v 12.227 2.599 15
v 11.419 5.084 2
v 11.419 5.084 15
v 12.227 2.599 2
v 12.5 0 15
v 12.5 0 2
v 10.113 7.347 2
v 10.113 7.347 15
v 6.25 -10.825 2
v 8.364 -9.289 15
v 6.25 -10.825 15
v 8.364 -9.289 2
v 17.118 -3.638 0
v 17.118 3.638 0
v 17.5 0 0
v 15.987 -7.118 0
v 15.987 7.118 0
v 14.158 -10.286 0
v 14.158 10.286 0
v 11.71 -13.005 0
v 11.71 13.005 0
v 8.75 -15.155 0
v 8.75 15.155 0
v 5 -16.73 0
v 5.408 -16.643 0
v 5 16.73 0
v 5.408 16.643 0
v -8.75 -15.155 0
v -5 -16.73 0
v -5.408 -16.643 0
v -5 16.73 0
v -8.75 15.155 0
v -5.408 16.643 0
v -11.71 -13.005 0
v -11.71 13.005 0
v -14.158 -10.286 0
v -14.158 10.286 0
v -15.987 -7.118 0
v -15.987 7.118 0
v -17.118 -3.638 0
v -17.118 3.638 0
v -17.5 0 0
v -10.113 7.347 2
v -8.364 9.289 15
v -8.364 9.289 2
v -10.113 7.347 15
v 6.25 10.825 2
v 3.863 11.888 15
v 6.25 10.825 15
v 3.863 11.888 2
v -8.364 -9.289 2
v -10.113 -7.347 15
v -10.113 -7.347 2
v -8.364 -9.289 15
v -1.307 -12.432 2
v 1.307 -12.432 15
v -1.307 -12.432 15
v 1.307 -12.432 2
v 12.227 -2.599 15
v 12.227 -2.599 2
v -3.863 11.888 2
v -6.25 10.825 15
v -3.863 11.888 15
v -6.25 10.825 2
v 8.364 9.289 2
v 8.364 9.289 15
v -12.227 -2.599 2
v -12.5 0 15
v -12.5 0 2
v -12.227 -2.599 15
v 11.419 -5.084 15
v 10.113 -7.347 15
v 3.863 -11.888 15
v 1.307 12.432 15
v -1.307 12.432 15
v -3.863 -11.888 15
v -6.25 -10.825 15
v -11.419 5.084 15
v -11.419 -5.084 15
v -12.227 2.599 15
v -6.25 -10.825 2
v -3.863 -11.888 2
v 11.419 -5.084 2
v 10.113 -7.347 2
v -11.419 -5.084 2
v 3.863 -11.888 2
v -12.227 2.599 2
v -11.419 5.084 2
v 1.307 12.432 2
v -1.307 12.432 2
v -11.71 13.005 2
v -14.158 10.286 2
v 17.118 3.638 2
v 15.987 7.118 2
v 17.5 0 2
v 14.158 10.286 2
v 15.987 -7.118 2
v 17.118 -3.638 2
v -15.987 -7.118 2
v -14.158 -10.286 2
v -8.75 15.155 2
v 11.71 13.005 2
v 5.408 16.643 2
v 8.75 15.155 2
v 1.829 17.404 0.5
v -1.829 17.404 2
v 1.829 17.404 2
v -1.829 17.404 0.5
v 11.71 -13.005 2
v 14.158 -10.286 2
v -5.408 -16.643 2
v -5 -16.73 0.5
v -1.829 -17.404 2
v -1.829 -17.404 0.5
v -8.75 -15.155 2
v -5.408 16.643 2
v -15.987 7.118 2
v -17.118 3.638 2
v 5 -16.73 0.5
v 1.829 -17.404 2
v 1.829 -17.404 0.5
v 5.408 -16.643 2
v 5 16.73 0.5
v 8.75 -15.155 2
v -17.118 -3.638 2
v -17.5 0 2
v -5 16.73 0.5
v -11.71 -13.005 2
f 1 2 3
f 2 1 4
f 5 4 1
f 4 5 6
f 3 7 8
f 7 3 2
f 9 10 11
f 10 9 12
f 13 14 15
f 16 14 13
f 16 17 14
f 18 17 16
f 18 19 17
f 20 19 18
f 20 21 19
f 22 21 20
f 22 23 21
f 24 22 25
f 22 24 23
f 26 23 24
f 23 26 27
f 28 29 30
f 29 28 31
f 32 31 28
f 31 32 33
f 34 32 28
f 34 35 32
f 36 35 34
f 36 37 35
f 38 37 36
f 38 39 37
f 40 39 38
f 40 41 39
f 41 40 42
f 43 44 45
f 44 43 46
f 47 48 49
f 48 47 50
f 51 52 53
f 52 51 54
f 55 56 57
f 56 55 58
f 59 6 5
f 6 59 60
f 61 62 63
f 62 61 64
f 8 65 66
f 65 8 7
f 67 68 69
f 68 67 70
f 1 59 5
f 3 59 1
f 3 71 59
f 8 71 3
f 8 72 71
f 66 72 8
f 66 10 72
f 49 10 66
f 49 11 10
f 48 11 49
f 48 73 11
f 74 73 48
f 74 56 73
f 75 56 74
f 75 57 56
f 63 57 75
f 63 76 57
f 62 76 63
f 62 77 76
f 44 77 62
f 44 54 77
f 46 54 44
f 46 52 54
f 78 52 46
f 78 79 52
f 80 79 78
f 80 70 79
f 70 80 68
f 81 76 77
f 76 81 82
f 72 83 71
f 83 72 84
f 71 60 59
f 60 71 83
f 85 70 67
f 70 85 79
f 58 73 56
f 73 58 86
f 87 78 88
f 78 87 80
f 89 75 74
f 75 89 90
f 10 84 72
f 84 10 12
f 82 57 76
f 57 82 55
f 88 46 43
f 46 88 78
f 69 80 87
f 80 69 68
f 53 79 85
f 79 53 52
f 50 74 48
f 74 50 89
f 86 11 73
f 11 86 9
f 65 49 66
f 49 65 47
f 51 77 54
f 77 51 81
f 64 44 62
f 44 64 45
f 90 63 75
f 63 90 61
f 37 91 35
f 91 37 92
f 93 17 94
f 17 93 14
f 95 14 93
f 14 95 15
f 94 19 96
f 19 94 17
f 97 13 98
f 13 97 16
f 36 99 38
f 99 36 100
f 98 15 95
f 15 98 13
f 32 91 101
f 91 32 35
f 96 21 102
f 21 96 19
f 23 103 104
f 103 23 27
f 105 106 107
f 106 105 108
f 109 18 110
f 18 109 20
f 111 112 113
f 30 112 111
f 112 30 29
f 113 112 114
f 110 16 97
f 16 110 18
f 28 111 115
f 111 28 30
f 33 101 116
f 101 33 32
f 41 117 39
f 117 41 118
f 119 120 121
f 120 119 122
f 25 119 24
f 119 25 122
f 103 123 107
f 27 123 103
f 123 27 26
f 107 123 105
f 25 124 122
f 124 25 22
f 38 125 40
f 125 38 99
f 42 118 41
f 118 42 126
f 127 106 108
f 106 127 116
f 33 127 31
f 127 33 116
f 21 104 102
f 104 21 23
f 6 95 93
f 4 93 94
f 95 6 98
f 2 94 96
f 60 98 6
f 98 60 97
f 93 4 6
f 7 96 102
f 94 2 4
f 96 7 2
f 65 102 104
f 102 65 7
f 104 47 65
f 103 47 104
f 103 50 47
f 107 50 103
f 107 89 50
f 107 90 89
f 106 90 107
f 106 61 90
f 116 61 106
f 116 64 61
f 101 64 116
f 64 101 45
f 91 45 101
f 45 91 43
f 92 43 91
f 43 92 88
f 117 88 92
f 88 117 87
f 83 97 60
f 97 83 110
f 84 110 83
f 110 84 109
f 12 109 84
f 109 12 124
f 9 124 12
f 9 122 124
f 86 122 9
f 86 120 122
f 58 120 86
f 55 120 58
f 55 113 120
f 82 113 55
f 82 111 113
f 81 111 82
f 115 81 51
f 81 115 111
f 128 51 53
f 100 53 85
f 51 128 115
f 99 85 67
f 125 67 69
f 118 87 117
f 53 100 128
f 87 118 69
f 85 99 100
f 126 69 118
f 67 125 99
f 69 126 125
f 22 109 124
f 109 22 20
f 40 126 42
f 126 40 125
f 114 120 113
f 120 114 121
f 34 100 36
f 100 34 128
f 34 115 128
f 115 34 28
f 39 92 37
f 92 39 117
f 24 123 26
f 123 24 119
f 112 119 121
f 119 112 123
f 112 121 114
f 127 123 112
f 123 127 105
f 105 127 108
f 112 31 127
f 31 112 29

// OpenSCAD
r = 12.5;
h = 15;
brim = 5;
walls = 4;

module button() {
    difference() {
        union() {
            cylinder(r=r, h=h);
            cylinder(r=r+brim, h=2);
        }
        cube([10,r*3,1], center=true);
    }
}

button();
